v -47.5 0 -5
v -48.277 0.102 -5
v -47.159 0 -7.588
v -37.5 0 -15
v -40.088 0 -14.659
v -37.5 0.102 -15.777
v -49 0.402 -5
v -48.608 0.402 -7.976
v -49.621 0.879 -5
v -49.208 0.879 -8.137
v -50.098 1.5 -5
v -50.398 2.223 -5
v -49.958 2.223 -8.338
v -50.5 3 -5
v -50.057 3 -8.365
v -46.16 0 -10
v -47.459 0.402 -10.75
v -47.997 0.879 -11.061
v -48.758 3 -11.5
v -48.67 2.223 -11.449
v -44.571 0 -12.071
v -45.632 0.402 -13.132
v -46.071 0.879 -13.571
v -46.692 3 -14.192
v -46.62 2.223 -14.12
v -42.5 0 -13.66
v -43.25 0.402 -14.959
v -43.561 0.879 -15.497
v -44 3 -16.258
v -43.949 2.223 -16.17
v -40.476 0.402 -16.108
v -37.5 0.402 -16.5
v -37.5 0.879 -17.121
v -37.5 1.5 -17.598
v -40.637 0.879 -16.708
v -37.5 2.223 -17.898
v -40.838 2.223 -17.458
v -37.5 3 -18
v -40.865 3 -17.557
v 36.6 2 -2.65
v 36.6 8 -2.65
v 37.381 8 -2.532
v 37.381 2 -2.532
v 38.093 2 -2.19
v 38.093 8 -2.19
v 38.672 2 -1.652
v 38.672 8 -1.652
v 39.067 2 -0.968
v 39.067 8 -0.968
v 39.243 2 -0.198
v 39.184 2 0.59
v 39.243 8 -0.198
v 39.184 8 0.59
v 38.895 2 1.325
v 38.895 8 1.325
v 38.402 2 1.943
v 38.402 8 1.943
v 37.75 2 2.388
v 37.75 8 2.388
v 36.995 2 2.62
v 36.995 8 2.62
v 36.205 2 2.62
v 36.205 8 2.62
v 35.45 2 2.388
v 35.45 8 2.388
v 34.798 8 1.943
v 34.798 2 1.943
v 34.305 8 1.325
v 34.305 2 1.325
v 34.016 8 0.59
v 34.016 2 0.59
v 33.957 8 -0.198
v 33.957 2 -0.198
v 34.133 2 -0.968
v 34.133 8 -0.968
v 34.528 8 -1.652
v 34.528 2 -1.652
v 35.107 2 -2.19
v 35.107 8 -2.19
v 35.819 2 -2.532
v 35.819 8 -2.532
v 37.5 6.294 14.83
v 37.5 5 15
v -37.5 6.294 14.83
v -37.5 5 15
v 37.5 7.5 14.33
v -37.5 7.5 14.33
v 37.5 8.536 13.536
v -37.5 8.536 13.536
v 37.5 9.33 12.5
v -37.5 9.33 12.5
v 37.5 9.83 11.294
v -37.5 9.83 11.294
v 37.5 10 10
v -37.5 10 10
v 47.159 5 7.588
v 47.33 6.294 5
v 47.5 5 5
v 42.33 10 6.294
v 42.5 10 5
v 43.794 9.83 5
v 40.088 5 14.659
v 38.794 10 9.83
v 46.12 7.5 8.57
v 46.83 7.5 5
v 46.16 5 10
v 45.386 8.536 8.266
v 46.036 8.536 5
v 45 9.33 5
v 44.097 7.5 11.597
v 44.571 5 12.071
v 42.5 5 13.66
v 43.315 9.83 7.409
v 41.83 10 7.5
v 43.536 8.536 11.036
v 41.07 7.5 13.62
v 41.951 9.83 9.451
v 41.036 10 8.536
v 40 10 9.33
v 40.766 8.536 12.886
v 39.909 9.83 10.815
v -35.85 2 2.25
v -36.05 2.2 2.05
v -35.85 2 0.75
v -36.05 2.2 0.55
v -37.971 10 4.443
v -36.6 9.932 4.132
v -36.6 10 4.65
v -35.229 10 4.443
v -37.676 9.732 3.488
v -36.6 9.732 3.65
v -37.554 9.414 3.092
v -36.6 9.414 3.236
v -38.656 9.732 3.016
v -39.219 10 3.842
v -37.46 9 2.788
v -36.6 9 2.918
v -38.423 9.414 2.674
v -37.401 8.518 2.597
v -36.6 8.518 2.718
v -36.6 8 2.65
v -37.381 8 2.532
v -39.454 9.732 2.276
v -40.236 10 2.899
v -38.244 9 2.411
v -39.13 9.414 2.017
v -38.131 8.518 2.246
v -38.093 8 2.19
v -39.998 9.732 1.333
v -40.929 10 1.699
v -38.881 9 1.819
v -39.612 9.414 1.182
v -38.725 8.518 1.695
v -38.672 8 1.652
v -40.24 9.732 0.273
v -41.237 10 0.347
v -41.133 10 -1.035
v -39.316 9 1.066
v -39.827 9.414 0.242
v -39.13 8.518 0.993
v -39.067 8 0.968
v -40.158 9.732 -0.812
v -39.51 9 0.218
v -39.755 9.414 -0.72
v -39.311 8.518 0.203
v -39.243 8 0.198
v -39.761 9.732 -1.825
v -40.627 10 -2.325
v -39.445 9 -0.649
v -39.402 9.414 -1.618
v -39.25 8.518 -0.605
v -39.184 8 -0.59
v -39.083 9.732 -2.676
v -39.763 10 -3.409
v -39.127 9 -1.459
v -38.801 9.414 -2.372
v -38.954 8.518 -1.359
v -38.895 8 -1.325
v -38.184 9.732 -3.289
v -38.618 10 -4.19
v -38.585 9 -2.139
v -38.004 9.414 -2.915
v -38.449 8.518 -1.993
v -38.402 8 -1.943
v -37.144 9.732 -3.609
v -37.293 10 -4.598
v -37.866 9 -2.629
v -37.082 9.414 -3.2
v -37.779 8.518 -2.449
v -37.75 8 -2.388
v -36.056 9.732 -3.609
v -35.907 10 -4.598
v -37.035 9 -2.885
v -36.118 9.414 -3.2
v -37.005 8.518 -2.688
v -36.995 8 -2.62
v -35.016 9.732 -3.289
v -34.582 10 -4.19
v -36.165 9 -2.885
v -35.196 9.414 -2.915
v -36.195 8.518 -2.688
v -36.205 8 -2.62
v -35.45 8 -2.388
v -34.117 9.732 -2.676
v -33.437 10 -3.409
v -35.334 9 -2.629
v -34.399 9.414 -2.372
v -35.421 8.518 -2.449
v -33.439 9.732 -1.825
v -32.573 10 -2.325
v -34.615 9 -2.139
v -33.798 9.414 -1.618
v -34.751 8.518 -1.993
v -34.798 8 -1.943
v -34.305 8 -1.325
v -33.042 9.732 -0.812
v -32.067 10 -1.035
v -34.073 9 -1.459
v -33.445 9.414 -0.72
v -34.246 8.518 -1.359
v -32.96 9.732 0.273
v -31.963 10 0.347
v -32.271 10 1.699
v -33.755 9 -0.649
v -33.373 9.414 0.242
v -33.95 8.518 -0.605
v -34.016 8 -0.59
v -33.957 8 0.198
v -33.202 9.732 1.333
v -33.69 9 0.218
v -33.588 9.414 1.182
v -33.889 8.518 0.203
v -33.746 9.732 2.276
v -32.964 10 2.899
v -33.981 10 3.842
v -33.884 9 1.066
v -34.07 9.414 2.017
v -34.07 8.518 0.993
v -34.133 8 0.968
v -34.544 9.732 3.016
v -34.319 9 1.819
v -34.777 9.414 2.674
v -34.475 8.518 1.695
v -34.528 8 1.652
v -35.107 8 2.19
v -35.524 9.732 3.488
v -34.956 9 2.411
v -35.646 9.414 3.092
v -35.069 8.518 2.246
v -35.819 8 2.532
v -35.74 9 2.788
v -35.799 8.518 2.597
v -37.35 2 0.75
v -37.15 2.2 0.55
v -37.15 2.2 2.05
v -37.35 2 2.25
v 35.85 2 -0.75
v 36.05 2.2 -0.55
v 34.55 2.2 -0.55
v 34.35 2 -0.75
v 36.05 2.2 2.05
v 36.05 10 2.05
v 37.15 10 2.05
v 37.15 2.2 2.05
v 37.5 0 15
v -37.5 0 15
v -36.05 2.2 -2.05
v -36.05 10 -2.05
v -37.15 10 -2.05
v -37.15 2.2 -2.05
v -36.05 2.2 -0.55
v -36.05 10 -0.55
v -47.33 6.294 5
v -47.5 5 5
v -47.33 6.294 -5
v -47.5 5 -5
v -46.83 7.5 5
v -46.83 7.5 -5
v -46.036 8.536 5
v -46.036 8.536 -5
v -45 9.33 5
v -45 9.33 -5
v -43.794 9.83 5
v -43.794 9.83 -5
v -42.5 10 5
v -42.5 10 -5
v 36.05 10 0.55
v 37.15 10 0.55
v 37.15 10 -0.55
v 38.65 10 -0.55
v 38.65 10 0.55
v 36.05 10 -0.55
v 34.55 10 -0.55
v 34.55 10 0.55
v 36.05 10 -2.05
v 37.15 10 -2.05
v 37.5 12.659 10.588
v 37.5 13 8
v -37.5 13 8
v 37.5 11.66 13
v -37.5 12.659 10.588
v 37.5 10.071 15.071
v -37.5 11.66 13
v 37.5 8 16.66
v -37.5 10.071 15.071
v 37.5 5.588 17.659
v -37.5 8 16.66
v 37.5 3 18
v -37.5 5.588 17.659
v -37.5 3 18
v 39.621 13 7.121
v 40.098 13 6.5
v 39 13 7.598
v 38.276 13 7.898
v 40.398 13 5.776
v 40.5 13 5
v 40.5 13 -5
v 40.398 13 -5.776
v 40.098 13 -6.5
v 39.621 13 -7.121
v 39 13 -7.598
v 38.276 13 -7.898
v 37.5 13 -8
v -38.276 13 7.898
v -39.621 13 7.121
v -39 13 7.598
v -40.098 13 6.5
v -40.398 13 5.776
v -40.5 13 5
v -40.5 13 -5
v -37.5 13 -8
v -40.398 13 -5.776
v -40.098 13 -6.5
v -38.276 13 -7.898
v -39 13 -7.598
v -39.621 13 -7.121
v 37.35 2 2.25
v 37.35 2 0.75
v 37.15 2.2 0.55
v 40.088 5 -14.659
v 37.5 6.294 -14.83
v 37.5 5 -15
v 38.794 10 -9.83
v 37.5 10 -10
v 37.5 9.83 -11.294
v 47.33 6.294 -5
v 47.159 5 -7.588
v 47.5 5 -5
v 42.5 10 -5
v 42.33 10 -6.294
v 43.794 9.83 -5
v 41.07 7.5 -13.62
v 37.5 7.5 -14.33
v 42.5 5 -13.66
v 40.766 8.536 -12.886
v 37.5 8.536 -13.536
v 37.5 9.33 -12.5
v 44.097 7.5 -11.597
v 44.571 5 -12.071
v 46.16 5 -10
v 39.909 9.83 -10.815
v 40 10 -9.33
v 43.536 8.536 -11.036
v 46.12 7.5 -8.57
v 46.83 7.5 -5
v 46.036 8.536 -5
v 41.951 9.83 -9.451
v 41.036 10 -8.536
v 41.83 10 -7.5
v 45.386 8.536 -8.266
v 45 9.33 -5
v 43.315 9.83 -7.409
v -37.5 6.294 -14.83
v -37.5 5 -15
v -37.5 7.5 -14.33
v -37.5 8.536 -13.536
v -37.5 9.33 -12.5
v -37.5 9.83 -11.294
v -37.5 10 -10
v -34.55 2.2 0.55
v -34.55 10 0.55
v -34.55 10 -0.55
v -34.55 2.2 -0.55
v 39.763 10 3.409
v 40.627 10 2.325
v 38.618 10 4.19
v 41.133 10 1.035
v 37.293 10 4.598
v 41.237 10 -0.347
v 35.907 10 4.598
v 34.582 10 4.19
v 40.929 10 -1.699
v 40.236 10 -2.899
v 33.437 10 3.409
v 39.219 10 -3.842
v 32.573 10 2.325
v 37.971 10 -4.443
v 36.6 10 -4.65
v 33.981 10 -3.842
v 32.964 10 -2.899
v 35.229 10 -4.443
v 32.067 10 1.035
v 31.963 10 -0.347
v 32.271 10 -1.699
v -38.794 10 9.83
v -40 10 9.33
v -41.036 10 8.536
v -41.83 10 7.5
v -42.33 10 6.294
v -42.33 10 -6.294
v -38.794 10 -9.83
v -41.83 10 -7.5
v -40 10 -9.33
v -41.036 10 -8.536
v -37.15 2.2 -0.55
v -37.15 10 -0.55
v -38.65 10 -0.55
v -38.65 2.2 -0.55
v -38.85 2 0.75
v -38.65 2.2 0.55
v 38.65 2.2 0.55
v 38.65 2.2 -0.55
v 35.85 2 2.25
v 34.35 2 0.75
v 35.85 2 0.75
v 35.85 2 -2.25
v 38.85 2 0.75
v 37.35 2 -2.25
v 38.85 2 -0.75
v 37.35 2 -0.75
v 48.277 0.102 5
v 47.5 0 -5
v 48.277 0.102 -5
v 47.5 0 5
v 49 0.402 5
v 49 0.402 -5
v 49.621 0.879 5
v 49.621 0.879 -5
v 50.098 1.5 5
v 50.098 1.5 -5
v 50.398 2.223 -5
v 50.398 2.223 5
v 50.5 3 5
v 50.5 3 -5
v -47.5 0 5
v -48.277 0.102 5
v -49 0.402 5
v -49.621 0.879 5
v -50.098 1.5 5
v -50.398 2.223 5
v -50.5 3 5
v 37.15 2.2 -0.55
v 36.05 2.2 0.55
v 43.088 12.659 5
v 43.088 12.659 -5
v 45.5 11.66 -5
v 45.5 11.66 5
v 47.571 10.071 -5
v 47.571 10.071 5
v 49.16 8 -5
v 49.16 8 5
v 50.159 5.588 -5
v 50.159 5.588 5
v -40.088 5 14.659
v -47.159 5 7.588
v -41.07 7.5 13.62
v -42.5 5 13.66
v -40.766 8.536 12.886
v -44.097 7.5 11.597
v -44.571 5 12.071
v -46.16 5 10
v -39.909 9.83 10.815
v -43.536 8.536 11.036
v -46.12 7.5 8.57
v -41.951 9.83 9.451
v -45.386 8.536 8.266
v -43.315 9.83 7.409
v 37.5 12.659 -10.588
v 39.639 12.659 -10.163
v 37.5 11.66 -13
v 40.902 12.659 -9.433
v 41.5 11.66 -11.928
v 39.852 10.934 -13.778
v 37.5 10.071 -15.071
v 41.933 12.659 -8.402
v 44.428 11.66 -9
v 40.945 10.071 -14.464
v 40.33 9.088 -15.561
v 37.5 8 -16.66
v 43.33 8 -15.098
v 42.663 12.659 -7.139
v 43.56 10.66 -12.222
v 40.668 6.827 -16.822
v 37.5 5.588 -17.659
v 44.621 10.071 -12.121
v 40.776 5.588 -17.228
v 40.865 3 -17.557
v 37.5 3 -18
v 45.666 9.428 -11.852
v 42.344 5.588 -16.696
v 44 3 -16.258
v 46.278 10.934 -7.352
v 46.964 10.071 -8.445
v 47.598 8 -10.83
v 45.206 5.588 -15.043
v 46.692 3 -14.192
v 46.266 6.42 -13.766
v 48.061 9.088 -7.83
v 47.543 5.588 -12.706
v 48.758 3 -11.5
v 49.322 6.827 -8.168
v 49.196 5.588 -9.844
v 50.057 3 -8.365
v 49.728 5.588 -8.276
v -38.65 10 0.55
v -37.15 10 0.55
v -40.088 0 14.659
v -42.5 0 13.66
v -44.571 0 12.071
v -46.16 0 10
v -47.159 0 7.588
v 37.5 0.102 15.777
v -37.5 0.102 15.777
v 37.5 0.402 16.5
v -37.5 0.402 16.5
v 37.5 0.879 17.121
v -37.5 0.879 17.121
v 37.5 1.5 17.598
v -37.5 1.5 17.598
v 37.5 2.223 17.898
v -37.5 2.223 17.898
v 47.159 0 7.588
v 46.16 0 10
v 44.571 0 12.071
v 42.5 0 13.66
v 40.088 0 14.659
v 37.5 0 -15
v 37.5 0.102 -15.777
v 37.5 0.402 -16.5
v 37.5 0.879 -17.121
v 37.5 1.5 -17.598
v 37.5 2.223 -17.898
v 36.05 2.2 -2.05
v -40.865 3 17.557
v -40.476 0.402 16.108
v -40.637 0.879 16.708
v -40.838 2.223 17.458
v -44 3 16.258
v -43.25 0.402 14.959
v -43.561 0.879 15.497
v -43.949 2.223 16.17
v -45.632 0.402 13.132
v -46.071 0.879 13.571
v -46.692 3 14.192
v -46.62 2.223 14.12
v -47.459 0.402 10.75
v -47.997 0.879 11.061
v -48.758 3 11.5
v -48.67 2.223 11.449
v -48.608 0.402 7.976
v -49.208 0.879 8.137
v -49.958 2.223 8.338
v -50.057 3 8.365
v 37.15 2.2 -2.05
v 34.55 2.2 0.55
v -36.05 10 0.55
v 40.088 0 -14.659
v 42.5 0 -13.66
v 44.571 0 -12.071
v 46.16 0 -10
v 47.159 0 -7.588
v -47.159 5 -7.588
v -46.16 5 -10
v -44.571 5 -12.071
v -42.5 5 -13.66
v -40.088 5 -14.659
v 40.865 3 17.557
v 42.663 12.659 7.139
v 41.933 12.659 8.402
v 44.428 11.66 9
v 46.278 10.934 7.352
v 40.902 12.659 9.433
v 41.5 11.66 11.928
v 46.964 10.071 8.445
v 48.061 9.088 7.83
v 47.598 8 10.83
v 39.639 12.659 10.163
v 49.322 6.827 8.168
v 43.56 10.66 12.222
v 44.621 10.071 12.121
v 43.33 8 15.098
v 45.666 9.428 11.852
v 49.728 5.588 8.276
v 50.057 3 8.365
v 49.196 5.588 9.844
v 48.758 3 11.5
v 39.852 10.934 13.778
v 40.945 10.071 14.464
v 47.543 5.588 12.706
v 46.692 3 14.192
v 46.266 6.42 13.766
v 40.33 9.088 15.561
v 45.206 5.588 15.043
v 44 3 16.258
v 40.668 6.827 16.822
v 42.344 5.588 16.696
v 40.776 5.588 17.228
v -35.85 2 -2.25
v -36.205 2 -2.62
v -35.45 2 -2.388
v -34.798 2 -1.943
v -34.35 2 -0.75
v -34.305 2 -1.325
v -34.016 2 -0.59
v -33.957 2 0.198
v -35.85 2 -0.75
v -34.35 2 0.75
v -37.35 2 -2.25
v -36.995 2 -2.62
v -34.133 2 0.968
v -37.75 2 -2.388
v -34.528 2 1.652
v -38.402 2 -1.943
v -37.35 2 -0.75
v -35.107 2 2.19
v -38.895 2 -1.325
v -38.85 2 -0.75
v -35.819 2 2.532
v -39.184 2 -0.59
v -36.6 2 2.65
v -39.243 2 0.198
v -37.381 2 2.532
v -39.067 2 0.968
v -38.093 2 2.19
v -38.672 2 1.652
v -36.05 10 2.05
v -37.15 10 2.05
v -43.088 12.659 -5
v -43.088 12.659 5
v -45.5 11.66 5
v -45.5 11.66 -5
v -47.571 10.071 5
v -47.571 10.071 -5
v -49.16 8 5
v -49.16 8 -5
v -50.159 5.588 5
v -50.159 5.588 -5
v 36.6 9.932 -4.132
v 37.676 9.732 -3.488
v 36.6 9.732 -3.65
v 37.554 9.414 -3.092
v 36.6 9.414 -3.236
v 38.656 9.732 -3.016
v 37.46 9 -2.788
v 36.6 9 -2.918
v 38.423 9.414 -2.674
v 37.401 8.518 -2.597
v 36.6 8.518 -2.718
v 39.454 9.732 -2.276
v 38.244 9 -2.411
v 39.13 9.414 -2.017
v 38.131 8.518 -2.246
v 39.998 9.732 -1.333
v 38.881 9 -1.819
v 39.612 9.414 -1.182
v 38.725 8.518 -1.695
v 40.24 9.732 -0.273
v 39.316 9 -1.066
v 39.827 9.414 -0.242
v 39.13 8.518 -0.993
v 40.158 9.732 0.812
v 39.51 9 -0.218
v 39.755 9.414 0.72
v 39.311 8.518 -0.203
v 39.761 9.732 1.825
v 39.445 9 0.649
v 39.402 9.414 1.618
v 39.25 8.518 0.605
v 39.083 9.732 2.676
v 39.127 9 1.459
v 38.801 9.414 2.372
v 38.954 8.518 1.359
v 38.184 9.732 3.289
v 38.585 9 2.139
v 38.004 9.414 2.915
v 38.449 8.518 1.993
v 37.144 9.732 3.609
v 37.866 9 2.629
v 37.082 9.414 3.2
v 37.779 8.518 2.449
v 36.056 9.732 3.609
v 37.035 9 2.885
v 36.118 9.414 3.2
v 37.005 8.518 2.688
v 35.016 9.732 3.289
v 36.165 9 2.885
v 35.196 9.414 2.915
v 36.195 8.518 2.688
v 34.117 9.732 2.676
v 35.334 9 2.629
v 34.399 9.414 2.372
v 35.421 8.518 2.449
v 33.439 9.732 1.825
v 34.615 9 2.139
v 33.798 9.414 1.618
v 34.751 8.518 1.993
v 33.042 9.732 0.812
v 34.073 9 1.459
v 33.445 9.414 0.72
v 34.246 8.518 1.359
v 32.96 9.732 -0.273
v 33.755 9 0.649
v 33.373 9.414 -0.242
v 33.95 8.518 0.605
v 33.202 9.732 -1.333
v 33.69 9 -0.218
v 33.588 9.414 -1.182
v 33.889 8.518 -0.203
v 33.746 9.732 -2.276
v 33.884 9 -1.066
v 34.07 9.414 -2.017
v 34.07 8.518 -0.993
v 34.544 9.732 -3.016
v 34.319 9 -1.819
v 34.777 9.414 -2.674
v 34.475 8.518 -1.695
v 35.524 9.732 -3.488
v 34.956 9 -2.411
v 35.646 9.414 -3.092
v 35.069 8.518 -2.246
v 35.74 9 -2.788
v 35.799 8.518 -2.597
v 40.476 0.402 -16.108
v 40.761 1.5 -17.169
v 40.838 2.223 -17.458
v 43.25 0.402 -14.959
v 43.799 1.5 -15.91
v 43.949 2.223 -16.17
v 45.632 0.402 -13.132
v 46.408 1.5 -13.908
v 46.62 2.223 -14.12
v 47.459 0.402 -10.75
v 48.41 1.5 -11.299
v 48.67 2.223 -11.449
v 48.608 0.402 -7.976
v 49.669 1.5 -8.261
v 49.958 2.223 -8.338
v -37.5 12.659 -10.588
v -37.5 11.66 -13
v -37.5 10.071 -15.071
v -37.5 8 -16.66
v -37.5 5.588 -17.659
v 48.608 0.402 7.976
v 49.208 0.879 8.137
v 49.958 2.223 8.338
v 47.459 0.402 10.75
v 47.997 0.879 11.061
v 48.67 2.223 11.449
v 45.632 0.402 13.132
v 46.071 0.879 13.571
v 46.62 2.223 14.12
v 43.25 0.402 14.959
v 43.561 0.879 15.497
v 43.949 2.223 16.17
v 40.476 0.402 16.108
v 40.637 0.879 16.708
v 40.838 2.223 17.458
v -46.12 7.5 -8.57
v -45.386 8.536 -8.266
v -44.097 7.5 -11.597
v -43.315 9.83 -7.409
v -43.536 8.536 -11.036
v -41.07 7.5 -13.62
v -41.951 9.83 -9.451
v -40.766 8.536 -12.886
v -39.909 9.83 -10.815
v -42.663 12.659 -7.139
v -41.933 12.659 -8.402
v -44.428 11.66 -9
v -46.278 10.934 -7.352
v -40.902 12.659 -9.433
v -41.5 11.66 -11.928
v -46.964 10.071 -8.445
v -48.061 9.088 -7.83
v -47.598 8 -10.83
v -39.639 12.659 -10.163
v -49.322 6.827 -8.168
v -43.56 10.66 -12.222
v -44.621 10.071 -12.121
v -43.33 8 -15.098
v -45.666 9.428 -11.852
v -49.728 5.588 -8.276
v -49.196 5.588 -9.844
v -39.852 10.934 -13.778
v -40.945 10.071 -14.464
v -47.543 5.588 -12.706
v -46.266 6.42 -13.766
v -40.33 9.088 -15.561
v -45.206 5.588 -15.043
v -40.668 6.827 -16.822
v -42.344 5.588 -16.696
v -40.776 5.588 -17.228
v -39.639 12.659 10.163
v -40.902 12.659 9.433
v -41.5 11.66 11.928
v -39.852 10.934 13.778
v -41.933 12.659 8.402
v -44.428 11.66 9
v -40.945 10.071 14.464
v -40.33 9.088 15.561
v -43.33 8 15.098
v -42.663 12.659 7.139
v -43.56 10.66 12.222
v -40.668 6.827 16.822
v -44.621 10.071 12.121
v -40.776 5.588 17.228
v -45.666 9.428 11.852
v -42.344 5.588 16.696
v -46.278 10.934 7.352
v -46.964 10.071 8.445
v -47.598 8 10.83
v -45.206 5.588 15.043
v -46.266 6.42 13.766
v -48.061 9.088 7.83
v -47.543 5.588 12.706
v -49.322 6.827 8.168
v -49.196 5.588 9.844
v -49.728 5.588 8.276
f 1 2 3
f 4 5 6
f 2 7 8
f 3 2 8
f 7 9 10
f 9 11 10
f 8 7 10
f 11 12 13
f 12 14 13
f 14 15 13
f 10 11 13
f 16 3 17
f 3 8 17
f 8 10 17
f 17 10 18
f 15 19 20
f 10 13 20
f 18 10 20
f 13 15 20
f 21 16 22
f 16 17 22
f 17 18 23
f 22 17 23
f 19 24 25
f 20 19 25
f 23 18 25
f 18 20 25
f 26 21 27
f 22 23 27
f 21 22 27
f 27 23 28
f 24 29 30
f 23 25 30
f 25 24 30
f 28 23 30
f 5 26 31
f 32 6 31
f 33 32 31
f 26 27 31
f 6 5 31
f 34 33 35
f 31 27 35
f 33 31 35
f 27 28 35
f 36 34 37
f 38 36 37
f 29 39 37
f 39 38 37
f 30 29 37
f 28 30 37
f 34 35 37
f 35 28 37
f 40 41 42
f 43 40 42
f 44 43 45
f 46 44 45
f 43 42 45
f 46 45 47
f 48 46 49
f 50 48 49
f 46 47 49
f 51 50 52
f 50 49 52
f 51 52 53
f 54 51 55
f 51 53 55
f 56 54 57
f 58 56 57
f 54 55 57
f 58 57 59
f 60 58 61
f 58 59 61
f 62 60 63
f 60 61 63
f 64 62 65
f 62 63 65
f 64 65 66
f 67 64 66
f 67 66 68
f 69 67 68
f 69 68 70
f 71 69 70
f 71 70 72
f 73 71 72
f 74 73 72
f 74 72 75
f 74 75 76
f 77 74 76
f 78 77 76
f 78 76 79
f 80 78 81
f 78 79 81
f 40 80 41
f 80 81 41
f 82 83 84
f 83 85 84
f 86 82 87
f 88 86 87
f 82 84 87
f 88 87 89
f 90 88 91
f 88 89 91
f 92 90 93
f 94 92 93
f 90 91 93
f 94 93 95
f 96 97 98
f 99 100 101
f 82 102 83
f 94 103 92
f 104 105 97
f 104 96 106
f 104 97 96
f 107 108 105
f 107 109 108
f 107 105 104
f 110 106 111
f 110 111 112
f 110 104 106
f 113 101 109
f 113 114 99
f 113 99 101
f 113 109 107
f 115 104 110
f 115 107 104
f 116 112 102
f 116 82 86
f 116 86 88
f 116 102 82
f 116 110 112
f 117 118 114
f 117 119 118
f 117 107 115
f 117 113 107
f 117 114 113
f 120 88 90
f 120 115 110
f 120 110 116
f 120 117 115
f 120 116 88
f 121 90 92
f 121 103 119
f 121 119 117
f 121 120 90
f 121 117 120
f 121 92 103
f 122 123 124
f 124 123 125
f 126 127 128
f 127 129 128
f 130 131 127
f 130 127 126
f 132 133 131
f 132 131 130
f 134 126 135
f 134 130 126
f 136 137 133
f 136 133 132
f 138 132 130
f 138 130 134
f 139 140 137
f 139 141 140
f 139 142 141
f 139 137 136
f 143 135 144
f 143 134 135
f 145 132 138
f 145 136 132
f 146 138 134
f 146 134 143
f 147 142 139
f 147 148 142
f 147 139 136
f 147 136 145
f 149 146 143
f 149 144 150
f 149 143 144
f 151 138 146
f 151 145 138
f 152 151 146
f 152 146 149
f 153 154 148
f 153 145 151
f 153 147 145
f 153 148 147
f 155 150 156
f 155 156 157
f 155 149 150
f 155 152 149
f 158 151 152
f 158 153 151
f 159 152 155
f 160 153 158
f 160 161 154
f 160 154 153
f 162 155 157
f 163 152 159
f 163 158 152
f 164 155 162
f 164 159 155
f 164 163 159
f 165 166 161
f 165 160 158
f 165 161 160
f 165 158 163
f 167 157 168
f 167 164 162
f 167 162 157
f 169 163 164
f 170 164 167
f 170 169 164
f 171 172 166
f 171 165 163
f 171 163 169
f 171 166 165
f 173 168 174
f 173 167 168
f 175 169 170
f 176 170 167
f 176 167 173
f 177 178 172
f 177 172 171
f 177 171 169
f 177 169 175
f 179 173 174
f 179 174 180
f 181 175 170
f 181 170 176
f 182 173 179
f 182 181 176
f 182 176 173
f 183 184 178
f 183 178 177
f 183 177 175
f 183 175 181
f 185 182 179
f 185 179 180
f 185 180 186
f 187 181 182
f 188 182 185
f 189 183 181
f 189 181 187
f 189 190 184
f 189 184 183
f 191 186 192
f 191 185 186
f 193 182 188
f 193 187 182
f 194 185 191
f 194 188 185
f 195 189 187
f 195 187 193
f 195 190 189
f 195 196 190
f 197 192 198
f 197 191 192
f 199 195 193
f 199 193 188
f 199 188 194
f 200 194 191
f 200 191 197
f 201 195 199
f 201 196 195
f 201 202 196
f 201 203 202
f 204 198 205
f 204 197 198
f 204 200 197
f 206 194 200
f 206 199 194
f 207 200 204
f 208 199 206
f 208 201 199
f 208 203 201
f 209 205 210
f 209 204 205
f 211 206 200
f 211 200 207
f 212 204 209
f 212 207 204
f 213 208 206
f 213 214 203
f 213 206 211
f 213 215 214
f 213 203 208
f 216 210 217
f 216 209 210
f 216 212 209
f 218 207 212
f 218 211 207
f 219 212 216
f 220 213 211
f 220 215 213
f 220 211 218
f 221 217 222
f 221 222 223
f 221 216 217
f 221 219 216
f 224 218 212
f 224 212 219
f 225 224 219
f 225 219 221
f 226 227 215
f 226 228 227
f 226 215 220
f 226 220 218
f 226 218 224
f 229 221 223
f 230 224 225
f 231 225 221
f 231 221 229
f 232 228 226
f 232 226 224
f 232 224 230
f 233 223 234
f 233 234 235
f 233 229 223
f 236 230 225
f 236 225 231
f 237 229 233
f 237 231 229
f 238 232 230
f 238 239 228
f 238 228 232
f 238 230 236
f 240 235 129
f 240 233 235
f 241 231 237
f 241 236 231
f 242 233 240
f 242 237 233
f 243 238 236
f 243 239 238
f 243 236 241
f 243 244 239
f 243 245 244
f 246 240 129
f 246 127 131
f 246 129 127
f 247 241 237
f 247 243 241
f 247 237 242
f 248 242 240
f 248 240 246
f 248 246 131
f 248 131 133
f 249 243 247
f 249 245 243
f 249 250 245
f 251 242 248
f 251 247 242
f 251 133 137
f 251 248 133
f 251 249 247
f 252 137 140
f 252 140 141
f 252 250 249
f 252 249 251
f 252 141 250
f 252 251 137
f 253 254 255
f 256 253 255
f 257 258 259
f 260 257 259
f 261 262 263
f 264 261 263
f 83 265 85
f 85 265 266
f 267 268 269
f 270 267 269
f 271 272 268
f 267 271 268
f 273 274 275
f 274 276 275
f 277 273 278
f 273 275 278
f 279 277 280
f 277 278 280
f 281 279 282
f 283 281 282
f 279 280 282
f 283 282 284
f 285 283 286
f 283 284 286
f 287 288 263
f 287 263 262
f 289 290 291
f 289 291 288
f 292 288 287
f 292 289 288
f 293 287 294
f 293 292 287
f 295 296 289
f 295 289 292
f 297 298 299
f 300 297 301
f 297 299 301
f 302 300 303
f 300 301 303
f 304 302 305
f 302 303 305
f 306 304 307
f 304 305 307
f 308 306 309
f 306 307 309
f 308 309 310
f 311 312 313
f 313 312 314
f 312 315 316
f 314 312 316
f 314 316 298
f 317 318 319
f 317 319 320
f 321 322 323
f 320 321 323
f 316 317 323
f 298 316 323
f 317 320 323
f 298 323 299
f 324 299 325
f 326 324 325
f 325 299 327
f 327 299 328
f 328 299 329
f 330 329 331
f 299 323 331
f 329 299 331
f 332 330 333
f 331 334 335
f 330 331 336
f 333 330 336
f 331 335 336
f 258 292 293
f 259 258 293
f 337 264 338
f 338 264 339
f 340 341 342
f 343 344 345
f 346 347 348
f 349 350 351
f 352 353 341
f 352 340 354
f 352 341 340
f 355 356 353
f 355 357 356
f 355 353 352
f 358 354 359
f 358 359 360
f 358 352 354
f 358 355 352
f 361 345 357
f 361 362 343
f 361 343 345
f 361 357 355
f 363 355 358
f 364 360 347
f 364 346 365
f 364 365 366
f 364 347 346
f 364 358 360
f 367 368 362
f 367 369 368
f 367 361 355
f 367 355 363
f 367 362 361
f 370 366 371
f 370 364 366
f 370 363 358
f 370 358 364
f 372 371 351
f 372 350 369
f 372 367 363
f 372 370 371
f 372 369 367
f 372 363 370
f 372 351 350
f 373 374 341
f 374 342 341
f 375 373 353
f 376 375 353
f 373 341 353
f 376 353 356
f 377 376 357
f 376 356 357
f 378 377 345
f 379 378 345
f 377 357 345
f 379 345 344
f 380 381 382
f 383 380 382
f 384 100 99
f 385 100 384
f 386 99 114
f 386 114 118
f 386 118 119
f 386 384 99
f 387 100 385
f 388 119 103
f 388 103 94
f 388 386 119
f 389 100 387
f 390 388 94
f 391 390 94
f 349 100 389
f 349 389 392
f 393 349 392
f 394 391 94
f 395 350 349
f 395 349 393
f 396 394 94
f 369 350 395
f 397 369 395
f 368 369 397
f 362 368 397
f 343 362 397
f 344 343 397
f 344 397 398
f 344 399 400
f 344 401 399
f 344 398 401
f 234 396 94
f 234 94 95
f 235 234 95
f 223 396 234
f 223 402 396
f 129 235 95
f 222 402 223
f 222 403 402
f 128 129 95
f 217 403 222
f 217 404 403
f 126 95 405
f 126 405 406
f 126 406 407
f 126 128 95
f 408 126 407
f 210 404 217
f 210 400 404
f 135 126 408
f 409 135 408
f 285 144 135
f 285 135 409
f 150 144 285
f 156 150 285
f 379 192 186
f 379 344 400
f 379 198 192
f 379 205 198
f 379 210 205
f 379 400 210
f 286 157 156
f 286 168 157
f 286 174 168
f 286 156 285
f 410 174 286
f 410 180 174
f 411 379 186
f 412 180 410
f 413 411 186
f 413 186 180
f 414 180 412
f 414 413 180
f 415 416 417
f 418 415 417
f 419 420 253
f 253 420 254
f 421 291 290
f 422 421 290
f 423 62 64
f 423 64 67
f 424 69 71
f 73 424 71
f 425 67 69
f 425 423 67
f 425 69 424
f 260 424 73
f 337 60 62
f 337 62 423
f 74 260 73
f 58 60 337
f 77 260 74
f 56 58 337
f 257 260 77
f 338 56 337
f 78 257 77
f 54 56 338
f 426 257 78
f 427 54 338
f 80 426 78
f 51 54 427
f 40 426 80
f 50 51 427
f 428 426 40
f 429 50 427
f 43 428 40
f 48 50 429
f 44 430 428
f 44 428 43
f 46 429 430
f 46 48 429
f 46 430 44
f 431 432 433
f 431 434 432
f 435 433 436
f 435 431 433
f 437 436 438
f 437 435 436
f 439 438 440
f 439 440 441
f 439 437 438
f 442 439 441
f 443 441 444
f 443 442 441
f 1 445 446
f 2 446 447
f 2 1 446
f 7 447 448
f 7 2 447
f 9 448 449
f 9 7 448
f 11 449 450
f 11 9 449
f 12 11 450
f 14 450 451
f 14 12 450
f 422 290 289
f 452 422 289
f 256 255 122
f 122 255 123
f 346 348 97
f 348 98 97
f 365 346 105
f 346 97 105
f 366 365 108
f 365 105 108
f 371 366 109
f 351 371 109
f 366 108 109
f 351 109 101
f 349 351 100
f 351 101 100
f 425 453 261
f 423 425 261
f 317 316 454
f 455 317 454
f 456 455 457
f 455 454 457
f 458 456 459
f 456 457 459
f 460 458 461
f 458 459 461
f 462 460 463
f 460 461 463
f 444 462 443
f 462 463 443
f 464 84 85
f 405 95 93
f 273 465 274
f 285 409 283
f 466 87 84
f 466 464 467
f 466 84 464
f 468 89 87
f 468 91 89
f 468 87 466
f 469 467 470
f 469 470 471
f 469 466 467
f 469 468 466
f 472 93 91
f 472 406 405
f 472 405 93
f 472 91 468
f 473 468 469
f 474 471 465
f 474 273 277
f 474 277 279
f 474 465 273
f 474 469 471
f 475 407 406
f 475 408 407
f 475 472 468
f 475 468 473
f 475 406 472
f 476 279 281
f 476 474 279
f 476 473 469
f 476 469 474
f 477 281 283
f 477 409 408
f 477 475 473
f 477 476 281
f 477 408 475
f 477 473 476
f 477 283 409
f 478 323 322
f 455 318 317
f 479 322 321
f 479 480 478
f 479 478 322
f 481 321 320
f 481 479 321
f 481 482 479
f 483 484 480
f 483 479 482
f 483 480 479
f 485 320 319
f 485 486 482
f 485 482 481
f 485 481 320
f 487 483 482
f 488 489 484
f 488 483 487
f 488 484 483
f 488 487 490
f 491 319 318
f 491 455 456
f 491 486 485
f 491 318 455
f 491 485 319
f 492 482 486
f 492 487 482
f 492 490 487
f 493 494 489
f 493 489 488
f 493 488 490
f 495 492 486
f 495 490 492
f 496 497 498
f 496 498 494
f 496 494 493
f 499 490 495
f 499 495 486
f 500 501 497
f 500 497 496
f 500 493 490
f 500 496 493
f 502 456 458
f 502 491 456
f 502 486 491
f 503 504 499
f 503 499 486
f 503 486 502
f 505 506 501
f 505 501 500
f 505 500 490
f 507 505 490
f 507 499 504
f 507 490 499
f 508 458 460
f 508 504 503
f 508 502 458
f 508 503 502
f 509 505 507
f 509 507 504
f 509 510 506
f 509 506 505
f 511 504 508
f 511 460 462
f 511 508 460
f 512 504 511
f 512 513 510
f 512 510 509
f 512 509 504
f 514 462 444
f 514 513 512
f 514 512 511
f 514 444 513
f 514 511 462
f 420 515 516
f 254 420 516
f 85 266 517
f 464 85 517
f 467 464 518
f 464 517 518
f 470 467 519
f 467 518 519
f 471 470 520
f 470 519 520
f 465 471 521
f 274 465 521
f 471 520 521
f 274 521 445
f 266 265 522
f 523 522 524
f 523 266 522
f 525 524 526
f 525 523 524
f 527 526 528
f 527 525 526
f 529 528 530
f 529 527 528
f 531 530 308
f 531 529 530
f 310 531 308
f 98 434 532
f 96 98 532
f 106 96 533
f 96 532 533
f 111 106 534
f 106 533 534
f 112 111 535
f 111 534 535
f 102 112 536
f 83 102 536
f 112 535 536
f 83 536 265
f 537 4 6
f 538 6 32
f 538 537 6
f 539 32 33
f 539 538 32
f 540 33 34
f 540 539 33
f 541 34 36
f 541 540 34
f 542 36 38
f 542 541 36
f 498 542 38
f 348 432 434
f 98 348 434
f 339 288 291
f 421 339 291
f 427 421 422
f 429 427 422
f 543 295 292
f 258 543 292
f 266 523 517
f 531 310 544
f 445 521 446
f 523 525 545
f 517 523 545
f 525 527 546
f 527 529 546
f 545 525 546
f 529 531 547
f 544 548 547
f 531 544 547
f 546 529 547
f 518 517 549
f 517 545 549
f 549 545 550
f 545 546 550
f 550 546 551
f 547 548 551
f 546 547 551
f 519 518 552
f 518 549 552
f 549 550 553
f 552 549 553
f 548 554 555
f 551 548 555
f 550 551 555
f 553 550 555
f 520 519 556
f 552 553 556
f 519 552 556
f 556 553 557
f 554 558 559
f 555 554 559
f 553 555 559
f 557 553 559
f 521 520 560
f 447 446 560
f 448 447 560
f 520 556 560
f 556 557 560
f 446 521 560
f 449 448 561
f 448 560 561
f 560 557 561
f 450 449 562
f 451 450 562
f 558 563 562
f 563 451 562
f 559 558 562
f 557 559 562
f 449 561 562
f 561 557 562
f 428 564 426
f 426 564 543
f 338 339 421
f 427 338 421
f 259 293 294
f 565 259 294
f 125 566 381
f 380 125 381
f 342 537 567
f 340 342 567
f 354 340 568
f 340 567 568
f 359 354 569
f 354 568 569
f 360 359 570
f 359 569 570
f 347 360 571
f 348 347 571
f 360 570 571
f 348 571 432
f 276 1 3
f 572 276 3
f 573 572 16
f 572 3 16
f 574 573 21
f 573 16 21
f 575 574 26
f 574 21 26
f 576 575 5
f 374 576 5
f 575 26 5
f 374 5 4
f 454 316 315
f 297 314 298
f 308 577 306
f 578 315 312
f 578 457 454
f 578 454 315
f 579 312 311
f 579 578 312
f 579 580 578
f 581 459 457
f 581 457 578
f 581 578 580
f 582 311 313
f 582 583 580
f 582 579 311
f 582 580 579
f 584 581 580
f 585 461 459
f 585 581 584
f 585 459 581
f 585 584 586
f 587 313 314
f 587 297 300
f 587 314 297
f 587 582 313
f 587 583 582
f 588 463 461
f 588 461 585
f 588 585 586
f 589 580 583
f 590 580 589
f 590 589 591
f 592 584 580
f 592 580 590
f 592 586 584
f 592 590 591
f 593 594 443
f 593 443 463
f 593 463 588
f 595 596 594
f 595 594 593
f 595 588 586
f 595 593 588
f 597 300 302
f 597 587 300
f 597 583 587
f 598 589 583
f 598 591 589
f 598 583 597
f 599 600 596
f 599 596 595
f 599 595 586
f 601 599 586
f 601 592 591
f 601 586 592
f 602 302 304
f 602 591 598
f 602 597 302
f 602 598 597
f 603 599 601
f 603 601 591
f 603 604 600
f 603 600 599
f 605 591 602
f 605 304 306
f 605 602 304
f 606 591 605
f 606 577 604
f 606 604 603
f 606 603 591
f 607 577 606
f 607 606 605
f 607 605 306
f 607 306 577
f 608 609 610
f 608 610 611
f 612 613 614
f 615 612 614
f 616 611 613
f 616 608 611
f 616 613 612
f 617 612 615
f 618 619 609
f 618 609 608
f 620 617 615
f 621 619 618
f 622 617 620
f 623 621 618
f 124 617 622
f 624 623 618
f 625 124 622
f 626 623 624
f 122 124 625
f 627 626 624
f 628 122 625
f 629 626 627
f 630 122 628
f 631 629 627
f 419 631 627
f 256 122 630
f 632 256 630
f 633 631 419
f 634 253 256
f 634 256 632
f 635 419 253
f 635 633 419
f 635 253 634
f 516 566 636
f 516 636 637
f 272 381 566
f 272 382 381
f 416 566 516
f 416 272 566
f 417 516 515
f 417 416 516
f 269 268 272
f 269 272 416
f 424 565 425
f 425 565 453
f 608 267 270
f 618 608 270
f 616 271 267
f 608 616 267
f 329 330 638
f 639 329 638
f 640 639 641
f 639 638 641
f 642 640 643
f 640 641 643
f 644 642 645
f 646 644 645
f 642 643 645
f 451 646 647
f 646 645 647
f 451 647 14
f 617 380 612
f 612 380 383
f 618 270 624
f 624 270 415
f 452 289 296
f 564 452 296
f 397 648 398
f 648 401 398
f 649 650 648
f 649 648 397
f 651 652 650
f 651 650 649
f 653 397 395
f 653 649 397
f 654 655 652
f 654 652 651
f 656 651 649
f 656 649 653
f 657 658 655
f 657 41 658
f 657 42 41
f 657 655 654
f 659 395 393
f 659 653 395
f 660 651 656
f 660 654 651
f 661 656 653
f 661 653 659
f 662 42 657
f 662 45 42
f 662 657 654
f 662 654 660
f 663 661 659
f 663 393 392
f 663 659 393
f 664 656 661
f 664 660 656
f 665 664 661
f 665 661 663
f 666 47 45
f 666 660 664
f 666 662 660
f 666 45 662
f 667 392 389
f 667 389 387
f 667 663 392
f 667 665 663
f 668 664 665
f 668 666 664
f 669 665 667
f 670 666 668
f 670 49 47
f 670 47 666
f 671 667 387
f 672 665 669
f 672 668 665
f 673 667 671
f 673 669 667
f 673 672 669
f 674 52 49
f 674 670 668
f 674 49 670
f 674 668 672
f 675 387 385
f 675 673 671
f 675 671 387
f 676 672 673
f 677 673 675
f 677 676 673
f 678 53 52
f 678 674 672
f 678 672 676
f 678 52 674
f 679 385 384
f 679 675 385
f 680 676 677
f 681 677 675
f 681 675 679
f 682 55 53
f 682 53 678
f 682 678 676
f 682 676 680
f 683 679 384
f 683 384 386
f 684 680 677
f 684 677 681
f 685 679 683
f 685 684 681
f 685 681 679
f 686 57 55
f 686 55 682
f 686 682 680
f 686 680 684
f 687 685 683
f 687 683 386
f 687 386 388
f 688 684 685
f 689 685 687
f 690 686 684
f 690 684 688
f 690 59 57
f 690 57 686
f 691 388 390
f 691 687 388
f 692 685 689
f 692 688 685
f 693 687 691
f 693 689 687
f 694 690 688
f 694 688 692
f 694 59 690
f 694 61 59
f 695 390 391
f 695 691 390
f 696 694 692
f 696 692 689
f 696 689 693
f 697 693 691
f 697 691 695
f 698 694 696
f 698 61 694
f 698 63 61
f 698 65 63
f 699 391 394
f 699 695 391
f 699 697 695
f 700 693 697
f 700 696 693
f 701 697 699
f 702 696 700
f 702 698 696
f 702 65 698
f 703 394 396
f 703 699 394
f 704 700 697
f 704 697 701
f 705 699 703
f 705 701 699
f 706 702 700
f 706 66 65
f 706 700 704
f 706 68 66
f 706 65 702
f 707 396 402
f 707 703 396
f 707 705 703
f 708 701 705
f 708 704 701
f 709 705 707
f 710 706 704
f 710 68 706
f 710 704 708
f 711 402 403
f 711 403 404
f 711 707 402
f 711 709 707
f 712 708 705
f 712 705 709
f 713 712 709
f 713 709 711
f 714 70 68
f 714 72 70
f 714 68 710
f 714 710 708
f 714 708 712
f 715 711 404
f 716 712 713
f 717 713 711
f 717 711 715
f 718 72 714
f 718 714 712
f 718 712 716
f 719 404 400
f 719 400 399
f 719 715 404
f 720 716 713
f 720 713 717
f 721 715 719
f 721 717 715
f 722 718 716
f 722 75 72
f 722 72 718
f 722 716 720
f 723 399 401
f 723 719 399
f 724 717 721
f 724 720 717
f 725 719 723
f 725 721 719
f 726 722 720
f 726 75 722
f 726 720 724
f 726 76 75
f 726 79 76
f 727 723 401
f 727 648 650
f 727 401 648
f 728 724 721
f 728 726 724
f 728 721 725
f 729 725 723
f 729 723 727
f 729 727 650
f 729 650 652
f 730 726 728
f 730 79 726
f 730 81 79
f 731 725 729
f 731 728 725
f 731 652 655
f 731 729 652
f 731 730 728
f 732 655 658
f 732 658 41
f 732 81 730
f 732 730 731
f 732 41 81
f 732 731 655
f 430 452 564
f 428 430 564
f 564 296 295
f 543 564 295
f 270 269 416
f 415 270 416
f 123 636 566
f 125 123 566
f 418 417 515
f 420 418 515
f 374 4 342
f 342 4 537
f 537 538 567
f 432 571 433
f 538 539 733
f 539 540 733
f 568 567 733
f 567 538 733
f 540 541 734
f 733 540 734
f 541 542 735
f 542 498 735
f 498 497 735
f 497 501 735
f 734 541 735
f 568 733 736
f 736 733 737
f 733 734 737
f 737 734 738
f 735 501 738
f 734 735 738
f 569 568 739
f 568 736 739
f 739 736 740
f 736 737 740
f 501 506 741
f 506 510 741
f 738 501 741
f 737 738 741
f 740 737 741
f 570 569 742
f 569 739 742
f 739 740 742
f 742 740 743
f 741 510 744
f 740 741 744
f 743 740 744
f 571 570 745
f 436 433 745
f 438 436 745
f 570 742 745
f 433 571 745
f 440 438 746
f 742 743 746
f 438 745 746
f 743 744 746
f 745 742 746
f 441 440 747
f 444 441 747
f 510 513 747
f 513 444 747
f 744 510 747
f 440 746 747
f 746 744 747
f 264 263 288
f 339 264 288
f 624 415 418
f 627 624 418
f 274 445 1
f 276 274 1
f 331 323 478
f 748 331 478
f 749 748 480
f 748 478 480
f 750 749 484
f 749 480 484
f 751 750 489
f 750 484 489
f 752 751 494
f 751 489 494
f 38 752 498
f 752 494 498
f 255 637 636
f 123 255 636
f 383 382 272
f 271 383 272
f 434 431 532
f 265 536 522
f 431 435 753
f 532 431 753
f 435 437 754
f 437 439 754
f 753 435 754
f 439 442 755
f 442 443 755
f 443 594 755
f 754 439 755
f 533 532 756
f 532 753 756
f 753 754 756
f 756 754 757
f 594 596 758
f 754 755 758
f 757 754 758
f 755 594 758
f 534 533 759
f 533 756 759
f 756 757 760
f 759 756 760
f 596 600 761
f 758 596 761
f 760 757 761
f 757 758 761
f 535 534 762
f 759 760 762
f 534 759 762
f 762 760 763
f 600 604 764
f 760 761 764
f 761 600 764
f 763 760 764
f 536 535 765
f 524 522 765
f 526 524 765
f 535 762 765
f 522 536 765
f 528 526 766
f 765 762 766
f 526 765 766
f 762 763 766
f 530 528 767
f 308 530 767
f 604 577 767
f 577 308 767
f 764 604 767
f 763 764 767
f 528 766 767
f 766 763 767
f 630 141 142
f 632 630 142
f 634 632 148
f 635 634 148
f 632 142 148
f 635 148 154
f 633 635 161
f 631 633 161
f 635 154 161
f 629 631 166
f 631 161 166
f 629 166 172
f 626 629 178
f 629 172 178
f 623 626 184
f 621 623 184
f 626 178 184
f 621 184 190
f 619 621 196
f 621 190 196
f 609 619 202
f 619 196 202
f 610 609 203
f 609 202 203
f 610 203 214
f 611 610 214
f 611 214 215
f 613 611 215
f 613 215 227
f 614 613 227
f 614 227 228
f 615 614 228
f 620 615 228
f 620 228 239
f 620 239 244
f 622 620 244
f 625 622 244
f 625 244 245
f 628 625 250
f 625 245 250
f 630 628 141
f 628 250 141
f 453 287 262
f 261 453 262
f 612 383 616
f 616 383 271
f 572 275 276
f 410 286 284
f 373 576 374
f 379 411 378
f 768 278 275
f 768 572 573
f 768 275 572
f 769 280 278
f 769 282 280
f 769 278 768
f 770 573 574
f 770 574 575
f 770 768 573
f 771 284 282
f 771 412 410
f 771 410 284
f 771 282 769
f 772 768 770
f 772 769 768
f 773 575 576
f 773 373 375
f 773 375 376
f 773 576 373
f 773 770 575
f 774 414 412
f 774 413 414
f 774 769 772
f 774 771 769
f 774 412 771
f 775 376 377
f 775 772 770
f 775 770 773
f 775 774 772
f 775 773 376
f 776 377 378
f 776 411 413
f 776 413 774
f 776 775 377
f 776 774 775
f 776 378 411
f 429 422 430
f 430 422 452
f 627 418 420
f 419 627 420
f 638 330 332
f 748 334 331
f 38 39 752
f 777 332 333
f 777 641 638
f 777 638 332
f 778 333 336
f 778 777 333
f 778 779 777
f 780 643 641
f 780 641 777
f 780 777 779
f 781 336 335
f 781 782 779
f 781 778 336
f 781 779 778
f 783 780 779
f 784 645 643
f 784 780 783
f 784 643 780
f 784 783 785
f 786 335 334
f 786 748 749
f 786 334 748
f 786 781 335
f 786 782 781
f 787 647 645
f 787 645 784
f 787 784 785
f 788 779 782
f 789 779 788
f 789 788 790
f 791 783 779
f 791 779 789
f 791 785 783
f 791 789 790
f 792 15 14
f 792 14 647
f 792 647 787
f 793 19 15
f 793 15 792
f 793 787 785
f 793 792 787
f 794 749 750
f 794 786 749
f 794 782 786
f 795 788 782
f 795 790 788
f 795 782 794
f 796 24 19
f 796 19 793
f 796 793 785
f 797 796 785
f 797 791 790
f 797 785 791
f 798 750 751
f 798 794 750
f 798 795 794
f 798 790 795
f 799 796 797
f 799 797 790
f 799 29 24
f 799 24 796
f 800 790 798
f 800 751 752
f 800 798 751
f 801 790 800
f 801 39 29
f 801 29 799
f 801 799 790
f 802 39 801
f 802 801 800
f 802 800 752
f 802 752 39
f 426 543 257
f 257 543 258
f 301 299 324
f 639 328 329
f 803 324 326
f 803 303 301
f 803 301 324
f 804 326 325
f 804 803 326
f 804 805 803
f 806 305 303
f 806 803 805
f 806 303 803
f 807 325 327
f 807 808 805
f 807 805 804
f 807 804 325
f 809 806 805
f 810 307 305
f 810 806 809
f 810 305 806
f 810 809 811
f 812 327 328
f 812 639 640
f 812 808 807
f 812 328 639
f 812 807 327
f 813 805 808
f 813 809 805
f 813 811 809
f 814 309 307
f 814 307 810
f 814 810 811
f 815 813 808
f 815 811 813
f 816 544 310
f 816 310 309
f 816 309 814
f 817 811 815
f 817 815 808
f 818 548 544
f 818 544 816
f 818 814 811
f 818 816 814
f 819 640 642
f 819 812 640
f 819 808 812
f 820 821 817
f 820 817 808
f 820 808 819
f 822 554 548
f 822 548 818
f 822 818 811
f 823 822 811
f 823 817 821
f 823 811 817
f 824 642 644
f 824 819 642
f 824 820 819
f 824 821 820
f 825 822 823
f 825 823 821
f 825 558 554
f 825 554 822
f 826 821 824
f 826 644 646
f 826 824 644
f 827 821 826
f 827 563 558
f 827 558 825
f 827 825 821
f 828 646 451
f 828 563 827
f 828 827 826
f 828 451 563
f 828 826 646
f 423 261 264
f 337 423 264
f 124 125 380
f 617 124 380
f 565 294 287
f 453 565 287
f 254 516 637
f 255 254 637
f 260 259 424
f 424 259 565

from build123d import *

# Parameters (mm, degrees)
EXTRUDE_1_DEPTH = 10
SHELL_2_T       = 3
FILLET_3_R      = 10
FILLET_4_R      = 3
SKETCH_2_R      = 2.65
EXTRUDE_2_DEPTH = 8
FILLET_7_R      = 5
CHAMFER_1_SIZE  = 0.2
CHAMFER_2_SIZE  = 0.2
FILLET_9_R      = 2
FILLET_10_R     = 2


# Some blends are built 0.0001 mm under size
with BuildPart() as part:
    # 草图1 → 凸台-拉伸1 (new body)
    with BuildSketch(Plane(origin=(0, 0, 0), x_dir=(1, 0, 0), z_dir=(0, 1, 0))):
        with BuildLine():
            Line((-37.5, 15), (37.5, 15))
            ThreePointArc((37.5, 15), (44.571067812, 12.071067812), (47.5, 5))
            Line((47.5, 5), (47.5, -5))
            ThreePointArc((47.5, -5), (44.571067812, -12.071067812), (37.5, -15))
            Line((37.5, -15), (-37.5, -15))
            ThreePointArc((-37.5, -15), (-44.571067812, -12.071067812), (-47.5, -5))
            Line((-47.5, -5), (-47.5, 5))
            ThreePointArc((-47.5, 5), (-44.571067812, 12.071067812), (-37.5, 15))
        make_face()
    extrude(amount=EXTRUDE_1_DEPTH)

    # 抽壳2
    shell_2_openings = [part.faces().sort_by_distance(p)[0] for p in [
        (0, 0, 0),
    ]]
    offset(amount=SHELL_2_T, openings=shell_2_openings, kind=Kind.INTERSECTION)

    # 圆角3
    # the kernel refuses this fillet: 10 mm, written as the material it takes off along each edge
    with BuildSketch(Plane(origin=(37.5, 13, 5), x_dir=(1, 0, 0), z_dir=(0, 0, -1))) as fillet_3_piece_1:
        with BuildLine():
            CenterArc((13 - FILLET_3_R, FILLET_3_R), FILLET_3_R, 270, 90)
            Line((13 - FILLET_3_R, 0), (13, 0))
            Line((13, 0), (13, FILLET_3_R))
        make_face()
    revolve(axis=Axis((37.5, 13, 5), (0, -1, 0)), revolution_arc=90, mode=Mode.SUBTRACT)
    with BuildSketch(Plane(origin=(50.5, 13, 5), x_dir=(0, -1, 0), z_dir=(0, 0, -1)), Plane(origin=(-50.5, 13, -5), x_dir=(0, -1, 0), z_dir=(0, 0, 1))) as fillet_3_piece_2:
        with BuildLine():
            CenterArc((FILLET_3_R, FILLET_3_R), FILLET_3_R, 180, 90)
            Line((0, FILLET_3_R), (0, 0))
            Line((0, 0), (FILLET_3_R, 0))
        make_face()
    extrude(amount=10, mode=Mode.SUBTRACT)
    with BuildSketch(Plane(origin=(37.5, 13, -5), x_dir=(0, 0, -1), z_dir=(-1, 0, 0))) as fillet_3_piece_3:
        with BuildLine():
            CenterArc((13 - FILLET_3_R, FILLET_3_R), FILLET_3_R, 270, 90)
            Line((13 - FILLET_3_R, 0), (13, 0))
            Line((13, 0), (13, FILLET_3_R))
        make_face()
    revolve(axis=Axis((37.5, 13, -5), (0, -1, 0)), revolution_arc=90, mode=Mode.SUBTRACT)
    with BuildSketch(Plane(origin=(37.5, 13, -18), x_dir=(0, -1, 0), z_dir=(-1, 0, 0)), Plane(origin=(-37.5, 13, 18), x_dir=(0, -1, 0), z_dir=(1, 0, 0))) as fillet_3_piece_4:
        with BuildLine():
            CenterArc((FILLET_3_R, FILLET_3_R), FILLET_3_R, 180, 90)
            Line((0, FILLET_3_R), (0, 0))
            Line((0, 0), (FILLET_3_R, 0))
        make_face()
    extrude(amount=75, mode=Mode.SUBTRACT)
    with BuildSketch(Plane(origin=(-37.5, 13, -5), x_dir=(-1, 0, 0), z_dir=(0, 0, 1))) as fillet_3_piece_5:
        with BuildLine():
            CenterArc((13 - FILLET_3_R, FILLET_3_R), FILLET_3_R, 270, 90)
            Line((13 - FILLET_3_R, 0), (13, 0))
            Line((13, 0), (13, FILLET_3_R))
        make_face()
    revolve(axis=Axis((-37.5, 13, -5), (0, -1, 0)), revolution_arc=90, mode=Mode.SUBTRACT)
    with BuildSketch(Plane(origin=(-37.5, 13, 5), x_dir=(0, 0, 1), z_dir=(1, 0, 0))) as fillet_3_piece_6:
        with BuildLine():
            CenterArc((13 - FILLET_3_R, FILLET_3_R), FILLET_3_R, 270, 90)
            Line((13 - FILLET_3_R, 0), (13, 0))
            Line((13, 0), (13, FILLET_3_R))
        make_face()
    revolve(axis=Axis((-37.5, 13, 5), (0, -1, 0)), revolution_arc=90, mode=Mode.SUBTRACT)

    # 圆角4
    fillet_4_edges = [part.edges().sort_by_distance(p)[0] for p in [
        (50.5, 0, 0),
        (46.692388155, 0, 14.192388155),
        (0, 0, 18),
        (-46.692388155, 0, 14.192388155),
        (-50.5, 0, 0),
        (-46.692388155, 0, -14.192388155),
        (0, 0, -18),
        (46.692388155, 0, -14.192388155),
    ]]
    fillet(fillet_4_edges, radius=FILLET_4_R - 0.0001)  # a hair under: the kernel refuses the full size

    # 草图2 → 凸台-拉伸2 (add)
    # profile 1 of 2: a face of its own
    with BuildSketch(Plane(origin=(0, 10, 0), x_dir=(-1, 0, 0), z_dir=(0, -1, 0))):
        with Locations(Location((36.6, 0, 0), (0, 0, 270))):
            Circle(SKETCH_2_R)
        Polygon((34.55, -0.55), (34.55, 0.55), (36.05, 0.55), (36.05, 2.05), (37.15, 2.05), (37.15, 0.55), (38.65, 0.55), (38.65, -0.55), (37.15, -0.55), (37.15, -2.05), (36.05, -2.05), (36.05, -0.55), align=None, mode=Mode.SUBTRACT)
    # profile 2 of 2: a face of its own
    with BuildSketch(Plane(origin=(0, 10, 0), x_dir=(-1, 0, 0), z_dir=(0, -1, 0))):
        with Locations(Location((-36.6, 0, 0), (0, 0, 90))):
            Circle(SKETCH_2_R)
        Polygon((-37.15, 0.55), (-37.15, 2.05), (-36.05, 2.05), (-36.05, 0.55), (-34.55, 0.55), (-34.55, -0.55), (-36.05, -0.55), (-36.05, -2.05), (-37.15, -2.05), (-37.15, -0.55), (-38.65, -0.55), (-38.65, 0.55), align=None, mode=Mode.SUBTRACT)
    extrude(amount=EXTRUDE_2_DEPTH)

    # 圆角7
    fillet_7_edges = [part.edges().sort_by_distance(p)[0] for p in [
        (-44.571067812, 10, 12.071067812),
        (0, 10, 15),
        (44.571067812, 10, 12.071067812),
        (47.5, 10, 0),
        (44.571067812, 10, -12.071067812),
        (0, 10, -15),
        (-44.571067812, 10, -12.071067812),
        (-47.5, 10, 0),
    ]]
    fillet(fillet_7_edges, radius=FILLET_7_R)

    # 倒角1
    chamfer_1_edges = [part.edges().sort_by_distance(p)[0] for p in [
        (35.3, 2, -0.55),
        (37.15, 2, 1.3),
        (38.65, 2, 0),
        (37.9, 2, -0.55),
        (37.15, 2, -1.3),
        (36.6, 2, -2.05),
        (34.55, 2, 0),
        (35.3, 2, 0.55),
        (36.05, 2, 1.3),
        (36.6, 2, 2.05),
        (37.9, 2, 0.55),
        (36.05, 2, -1.3),
    ]]
    chamfer(chamfer_1_edges, length=CHAMFER_1_SIZE)

    # 倒角2
    chamfer_2_edges = [part.edges().sort_by_distance(p)[0] for p in [
        (-36.6, 2, -2.05),
        (-37.15, 2, -1.3),
        (-37.9, 2, -0.55),
        (-38.65, 2, 0),
        (-37.15, 2, 1.3),
        (-35.3, 2, -0.55),
        (-37.9, 2, 0.55),
        (-36.6, 2, 2.05),
        (-36.05, 2, 1.3),
        (-35.3, 2, 0.55),
        (-34.55, 2, 0),
        (-36.05, 2, -1.3),
    ]]
    chamfer(chamfer_2_edges, length=CHAMFER_2_SIZE)

    # 圆角9
    fillet_9_edges = [part.edges().sort_by_distance(p)[0] for p in [
        (36.6, 10, 2.65),
    ]]
    fillet(fillet_9_edges, radius=FILLET_9_R)

    # 圆角10
    fillet_10_edges = [part.edges().sort_by_distance(p)[0] for p in [
        (-36.6, 10, -2.65),
    ]]
    fillet(fillet_10_edges, radius=FILLET_10_R)


solid = part.part
